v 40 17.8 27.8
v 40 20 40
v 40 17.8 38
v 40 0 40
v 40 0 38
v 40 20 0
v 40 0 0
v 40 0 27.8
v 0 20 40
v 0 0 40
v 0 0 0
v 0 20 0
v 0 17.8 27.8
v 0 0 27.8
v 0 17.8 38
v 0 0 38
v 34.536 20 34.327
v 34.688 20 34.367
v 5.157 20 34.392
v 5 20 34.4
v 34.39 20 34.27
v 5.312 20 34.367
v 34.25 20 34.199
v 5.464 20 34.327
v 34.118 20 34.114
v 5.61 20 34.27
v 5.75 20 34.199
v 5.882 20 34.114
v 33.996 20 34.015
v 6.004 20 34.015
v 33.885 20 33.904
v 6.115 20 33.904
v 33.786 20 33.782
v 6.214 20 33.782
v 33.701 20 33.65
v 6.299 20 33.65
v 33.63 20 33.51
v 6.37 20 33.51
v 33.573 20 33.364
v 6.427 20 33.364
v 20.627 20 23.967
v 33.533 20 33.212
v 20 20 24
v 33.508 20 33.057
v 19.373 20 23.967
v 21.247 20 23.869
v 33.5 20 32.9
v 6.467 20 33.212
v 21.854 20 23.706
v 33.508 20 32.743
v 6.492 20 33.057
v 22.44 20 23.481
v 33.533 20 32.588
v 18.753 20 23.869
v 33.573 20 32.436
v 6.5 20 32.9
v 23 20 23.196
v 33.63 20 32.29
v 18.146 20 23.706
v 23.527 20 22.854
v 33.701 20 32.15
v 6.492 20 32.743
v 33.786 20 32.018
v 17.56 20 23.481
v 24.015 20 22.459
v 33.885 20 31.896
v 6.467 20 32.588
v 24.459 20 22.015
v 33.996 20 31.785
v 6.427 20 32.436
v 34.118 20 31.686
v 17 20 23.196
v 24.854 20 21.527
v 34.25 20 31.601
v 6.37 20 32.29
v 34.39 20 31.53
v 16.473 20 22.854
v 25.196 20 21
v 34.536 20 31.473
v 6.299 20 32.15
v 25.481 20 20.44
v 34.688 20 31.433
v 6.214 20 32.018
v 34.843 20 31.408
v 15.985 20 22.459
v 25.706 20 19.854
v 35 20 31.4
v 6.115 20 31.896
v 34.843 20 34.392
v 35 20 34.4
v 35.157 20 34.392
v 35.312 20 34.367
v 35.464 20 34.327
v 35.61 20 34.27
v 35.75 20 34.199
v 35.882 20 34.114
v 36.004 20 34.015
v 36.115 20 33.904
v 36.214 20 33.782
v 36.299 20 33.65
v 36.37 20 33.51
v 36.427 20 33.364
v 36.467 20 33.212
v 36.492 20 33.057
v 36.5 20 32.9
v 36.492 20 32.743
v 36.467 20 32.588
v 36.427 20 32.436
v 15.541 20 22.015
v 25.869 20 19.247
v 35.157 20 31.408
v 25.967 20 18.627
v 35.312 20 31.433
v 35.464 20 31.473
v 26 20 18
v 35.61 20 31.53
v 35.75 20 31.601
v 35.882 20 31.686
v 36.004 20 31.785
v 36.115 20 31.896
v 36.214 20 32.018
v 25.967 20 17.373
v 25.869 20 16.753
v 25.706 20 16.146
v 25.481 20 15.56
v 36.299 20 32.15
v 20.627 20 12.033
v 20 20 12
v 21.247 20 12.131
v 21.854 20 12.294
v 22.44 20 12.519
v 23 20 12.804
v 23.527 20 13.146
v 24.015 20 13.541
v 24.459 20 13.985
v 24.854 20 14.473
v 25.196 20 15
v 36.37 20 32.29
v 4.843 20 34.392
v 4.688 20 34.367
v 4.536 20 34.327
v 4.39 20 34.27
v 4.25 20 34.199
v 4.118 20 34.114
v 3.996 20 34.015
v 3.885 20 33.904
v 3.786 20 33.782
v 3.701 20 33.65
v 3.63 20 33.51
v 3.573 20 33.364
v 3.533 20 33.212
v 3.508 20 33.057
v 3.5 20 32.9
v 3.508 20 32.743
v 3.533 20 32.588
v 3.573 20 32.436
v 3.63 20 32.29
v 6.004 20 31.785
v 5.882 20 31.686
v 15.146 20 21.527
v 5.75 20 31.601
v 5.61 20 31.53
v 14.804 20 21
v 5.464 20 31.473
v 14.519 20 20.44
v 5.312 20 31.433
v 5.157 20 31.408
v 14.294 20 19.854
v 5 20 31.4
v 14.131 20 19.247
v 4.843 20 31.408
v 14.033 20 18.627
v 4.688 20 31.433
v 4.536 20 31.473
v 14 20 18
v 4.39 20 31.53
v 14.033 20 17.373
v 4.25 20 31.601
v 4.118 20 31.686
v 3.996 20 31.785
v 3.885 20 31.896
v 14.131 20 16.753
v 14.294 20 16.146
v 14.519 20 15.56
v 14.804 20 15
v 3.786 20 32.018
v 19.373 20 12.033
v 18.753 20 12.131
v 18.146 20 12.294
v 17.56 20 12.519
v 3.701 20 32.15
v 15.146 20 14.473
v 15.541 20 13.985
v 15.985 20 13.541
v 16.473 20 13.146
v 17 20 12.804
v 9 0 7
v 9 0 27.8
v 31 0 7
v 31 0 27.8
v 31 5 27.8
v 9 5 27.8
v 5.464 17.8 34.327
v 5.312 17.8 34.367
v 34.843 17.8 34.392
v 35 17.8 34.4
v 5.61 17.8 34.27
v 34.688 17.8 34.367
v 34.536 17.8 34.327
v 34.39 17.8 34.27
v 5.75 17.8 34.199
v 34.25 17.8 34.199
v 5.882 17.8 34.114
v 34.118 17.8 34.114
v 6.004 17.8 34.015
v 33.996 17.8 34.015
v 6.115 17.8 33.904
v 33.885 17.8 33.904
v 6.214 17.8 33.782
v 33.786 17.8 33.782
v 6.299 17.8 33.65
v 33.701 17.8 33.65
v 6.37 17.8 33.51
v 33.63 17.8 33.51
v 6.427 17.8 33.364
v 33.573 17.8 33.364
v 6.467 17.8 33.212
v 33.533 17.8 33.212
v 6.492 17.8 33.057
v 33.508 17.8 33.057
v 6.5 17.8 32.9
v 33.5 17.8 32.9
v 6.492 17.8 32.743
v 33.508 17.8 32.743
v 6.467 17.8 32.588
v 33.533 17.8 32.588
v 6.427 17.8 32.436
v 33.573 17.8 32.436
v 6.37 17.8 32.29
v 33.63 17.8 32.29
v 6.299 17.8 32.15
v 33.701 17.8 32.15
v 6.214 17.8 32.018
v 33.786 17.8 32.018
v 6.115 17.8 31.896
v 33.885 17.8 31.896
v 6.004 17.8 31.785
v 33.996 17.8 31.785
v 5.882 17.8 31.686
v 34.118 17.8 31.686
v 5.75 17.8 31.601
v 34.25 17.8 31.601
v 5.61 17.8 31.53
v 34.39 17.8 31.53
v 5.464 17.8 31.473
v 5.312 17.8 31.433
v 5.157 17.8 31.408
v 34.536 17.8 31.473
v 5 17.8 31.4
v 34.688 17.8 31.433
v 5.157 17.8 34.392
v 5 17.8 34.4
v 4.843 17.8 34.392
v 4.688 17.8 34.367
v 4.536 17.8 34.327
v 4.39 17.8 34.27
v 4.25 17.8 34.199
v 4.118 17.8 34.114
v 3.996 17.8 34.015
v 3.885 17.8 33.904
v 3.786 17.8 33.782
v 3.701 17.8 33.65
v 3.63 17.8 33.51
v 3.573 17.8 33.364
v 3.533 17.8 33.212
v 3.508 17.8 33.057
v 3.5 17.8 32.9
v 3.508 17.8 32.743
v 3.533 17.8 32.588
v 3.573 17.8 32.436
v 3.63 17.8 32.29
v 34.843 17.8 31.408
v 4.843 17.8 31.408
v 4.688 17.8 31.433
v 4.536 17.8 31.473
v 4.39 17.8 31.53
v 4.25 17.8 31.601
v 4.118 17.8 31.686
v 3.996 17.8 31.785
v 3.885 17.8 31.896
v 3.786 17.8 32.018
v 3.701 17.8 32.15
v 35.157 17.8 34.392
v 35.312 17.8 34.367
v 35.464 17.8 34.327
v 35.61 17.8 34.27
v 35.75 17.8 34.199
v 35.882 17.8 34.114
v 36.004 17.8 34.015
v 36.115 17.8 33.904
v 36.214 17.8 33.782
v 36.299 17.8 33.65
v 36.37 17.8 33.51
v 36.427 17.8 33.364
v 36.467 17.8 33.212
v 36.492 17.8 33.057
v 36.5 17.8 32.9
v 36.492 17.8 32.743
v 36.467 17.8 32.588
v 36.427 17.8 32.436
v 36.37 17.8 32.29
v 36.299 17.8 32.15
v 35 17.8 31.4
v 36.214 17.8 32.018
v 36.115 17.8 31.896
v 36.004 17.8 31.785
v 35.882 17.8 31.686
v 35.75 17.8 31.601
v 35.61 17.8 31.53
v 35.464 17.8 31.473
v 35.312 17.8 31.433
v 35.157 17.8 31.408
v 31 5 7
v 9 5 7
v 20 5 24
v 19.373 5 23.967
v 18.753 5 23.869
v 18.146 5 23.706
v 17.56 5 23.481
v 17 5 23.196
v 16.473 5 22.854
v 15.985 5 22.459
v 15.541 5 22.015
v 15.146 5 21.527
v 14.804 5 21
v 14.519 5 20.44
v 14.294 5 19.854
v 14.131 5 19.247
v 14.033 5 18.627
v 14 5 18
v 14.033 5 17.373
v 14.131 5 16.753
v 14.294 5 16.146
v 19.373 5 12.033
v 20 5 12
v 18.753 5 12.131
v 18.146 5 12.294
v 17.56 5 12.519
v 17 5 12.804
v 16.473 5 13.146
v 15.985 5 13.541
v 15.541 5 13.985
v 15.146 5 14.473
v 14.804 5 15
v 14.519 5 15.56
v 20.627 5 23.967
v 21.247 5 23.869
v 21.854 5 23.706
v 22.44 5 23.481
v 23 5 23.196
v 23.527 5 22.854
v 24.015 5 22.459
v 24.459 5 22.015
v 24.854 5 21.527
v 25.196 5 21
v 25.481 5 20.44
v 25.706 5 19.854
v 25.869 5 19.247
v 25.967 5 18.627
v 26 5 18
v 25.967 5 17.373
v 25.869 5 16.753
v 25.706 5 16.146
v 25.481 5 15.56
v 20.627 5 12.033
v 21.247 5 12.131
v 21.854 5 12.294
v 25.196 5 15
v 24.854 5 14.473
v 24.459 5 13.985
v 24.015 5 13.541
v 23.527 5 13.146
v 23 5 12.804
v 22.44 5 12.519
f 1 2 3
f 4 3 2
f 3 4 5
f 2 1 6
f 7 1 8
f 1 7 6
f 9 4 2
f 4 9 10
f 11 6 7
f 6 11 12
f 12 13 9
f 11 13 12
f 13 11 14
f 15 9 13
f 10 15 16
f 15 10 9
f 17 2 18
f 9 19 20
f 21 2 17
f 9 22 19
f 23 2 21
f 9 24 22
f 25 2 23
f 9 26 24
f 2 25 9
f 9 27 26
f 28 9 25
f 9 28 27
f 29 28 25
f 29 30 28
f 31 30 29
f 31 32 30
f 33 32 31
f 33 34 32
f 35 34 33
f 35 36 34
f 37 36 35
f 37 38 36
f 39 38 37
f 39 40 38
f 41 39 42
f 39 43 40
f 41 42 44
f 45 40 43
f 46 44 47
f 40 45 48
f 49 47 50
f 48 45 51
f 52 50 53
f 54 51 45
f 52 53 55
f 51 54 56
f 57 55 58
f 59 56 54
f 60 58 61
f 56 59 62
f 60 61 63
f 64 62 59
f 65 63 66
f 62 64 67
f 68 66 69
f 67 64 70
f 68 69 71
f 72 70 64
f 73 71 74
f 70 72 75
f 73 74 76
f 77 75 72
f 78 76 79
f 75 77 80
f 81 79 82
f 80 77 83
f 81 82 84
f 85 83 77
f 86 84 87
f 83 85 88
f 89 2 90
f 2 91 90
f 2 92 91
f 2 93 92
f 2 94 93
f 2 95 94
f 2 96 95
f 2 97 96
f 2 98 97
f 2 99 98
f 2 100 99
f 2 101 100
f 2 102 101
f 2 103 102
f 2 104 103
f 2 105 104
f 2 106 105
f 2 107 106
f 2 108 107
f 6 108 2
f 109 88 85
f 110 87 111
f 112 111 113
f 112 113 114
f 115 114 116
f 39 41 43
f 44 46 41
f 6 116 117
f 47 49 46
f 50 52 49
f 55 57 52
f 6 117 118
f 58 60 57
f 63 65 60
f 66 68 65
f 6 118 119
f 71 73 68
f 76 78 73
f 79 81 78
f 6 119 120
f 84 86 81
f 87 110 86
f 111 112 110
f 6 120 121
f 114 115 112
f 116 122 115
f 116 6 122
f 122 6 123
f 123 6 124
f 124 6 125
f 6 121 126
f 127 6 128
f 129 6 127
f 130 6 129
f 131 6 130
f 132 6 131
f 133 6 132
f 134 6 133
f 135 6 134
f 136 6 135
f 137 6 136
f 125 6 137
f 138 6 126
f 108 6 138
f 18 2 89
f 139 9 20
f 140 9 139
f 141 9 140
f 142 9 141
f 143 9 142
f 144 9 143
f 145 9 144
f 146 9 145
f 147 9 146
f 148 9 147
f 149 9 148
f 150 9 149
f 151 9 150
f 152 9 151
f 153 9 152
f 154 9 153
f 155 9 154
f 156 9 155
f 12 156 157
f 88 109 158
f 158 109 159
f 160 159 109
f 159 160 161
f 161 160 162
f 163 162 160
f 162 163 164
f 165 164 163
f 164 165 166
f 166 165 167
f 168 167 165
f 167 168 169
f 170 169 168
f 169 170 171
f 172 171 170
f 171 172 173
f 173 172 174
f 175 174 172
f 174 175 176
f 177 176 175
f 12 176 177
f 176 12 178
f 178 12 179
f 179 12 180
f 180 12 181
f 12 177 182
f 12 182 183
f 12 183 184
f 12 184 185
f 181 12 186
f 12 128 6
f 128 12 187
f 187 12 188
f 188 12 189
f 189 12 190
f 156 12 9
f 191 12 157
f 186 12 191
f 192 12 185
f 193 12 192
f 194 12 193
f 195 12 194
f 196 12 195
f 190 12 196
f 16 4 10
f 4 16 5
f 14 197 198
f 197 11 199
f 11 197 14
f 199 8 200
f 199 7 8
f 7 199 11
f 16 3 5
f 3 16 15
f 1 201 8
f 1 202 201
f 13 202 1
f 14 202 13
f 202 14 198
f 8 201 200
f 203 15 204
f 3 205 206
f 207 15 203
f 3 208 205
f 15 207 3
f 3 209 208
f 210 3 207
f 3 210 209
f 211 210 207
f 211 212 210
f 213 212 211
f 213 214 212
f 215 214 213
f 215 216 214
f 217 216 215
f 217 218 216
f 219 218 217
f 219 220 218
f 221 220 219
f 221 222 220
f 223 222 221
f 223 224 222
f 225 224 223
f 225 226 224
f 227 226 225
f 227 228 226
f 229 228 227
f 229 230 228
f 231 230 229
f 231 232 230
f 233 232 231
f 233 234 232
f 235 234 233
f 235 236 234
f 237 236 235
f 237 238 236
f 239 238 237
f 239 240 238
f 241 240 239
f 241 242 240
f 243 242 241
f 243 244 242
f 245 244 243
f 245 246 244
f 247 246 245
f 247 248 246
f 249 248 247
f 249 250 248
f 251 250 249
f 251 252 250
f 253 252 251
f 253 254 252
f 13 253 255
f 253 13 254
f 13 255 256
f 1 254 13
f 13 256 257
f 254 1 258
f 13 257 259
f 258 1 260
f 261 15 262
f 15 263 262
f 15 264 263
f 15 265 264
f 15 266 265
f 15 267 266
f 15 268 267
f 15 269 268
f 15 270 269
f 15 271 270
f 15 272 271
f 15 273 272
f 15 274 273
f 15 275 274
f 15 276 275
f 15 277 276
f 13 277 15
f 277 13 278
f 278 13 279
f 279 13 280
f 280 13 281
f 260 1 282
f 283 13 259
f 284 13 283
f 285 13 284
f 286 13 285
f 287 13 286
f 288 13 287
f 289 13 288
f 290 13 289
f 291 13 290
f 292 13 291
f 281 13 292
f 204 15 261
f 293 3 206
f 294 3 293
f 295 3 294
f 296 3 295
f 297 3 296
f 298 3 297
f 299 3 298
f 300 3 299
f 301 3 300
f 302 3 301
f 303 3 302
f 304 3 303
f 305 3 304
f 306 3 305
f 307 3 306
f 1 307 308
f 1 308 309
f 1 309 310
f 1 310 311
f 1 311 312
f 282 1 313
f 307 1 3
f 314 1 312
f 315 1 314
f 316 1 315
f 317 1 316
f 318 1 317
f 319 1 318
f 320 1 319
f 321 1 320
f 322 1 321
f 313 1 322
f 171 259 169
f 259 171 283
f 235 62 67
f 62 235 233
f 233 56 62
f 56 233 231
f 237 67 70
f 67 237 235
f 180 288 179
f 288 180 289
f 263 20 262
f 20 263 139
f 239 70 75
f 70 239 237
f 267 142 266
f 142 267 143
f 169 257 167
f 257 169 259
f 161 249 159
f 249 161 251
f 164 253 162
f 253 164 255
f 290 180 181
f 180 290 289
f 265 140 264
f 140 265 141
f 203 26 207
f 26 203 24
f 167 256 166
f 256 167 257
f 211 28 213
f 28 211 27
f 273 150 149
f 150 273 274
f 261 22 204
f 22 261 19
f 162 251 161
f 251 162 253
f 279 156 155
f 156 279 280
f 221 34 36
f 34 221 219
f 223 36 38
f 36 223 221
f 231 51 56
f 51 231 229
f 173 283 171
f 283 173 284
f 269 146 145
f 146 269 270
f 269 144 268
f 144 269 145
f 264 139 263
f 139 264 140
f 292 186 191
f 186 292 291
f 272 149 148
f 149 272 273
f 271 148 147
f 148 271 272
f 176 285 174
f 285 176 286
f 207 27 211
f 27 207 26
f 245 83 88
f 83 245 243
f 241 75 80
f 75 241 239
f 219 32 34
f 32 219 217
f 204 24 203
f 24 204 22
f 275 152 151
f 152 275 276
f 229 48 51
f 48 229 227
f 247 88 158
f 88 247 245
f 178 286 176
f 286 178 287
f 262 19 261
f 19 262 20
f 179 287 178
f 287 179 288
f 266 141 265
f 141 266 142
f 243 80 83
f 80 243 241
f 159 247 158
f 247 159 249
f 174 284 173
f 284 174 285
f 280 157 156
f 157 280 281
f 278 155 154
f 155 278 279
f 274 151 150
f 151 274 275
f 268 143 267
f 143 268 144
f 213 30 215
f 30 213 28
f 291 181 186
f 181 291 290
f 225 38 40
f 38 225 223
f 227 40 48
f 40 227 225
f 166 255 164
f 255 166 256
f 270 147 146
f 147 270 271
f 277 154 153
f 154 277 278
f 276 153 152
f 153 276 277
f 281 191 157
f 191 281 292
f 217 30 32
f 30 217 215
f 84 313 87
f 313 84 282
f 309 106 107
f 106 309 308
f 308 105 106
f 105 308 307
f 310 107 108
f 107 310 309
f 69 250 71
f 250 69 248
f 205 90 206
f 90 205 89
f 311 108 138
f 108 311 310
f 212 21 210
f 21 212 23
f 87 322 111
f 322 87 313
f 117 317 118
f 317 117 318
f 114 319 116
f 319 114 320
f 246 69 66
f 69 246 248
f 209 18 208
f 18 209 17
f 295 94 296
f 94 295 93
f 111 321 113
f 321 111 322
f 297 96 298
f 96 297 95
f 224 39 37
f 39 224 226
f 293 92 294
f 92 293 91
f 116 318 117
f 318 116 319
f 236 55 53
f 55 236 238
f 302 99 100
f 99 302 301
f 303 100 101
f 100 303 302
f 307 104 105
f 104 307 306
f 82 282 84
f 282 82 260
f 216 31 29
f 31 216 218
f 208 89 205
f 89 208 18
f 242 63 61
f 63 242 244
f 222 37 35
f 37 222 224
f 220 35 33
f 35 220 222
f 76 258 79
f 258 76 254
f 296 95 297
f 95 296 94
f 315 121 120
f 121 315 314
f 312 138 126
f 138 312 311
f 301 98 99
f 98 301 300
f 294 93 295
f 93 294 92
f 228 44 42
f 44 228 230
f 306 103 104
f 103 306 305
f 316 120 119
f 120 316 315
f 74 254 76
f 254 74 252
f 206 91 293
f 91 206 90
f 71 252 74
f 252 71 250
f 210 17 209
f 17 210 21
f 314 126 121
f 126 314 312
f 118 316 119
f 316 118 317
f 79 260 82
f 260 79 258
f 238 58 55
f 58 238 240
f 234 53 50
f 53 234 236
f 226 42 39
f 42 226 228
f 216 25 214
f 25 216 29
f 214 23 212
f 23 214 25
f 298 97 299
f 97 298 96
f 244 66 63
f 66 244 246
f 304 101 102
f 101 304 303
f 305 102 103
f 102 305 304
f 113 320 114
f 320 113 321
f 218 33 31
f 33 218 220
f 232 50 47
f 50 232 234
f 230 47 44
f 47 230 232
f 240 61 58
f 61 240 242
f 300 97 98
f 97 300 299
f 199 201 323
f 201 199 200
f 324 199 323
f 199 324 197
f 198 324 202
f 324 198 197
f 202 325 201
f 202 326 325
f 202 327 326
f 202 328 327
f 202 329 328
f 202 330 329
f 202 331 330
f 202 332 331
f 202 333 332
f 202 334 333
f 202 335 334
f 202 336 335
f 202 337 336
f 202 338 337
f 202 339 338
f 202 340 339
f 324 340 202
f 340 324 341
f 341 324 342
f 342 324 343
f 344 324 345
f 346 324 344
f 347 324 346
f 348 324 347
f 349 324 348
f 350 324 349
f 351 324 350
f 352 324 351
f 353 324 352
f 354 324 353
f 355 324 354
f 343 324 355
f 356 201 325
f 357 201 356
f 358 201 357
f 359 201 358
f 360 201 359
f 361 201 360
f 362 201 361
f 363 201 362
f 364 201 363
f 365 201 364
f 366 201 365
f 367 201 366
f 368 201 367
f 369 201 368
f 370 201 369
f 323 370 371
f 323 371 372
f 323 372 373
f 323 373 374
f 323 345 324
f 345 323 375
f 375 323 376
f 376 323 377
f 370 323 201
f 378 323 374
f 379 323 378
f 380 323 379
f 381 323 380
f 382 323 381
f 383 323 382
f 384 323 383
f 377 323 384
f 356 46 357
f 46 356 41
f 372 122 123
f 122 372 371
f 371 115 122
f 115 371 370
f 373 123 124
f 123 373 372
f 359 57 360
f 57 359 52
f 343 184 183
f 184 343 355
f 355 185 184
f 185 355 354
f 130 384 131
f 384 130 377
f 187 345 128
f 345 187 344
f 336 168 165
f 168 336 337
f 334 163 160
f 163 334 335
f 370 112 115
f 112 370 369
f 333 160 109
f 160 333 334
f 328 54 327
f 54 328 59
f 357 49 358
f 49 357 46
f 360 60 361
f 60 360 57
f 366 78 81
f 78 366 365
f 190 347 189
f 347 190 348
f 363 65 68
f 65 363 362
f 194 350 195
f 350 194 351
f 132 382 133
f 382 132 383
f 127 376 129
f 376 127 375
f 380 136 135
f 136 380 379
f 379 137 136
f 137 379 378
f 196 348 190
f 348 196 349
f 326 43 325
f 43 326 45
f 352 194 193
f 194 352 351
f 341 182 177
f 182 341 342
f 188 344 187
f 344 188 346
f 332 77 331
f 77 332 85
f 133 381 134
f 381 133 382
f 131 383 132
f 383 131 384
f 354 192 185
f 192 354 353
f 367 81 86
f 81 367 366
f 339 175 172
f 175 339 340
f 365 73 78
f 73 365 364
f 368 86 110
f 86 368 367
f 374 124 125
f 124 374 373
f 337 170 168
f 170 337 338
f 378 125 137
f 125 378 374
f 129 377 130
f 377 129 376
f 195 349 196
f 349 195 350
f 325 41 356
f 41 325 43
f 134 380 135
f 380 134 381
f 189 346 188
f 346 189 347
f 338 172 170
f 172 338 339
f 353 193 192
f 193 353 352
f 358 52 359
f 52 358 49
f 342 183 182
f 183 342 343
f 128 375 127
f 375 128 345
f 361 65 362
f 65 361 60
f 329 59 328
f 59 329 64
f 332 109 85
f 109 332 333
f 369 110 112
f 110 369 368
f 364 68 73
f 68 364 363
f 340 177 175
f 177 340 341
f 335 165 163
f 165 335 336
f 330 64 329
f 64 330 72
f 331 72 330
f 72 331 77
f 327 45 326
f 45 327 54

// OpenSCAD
$fn=60;
bearing_holder();

module bearing_holder() {
    difference () {
        cube([40,20,40]);
        translate([0,0,27.8])
            cube([40,17.8,10.2]);
        translate([5,0,27.8+(10.2/2)])
            rotate([-90,0,0])
            cylinder(d=3,h=20);
        translate([35,0,27.8+(10.2/2)])
            rotate([-90,0,0])
            cylinder(d=3,h=20);
        translate([(40/2)-(22/2),0,40-2-9-22])
            cube([22,5,22]);
        translate([40/2,0,40-2-9-(22/2)])
            rotate([-90,0,0])
            cylinder(d=12,h=20);
    }
}
    
